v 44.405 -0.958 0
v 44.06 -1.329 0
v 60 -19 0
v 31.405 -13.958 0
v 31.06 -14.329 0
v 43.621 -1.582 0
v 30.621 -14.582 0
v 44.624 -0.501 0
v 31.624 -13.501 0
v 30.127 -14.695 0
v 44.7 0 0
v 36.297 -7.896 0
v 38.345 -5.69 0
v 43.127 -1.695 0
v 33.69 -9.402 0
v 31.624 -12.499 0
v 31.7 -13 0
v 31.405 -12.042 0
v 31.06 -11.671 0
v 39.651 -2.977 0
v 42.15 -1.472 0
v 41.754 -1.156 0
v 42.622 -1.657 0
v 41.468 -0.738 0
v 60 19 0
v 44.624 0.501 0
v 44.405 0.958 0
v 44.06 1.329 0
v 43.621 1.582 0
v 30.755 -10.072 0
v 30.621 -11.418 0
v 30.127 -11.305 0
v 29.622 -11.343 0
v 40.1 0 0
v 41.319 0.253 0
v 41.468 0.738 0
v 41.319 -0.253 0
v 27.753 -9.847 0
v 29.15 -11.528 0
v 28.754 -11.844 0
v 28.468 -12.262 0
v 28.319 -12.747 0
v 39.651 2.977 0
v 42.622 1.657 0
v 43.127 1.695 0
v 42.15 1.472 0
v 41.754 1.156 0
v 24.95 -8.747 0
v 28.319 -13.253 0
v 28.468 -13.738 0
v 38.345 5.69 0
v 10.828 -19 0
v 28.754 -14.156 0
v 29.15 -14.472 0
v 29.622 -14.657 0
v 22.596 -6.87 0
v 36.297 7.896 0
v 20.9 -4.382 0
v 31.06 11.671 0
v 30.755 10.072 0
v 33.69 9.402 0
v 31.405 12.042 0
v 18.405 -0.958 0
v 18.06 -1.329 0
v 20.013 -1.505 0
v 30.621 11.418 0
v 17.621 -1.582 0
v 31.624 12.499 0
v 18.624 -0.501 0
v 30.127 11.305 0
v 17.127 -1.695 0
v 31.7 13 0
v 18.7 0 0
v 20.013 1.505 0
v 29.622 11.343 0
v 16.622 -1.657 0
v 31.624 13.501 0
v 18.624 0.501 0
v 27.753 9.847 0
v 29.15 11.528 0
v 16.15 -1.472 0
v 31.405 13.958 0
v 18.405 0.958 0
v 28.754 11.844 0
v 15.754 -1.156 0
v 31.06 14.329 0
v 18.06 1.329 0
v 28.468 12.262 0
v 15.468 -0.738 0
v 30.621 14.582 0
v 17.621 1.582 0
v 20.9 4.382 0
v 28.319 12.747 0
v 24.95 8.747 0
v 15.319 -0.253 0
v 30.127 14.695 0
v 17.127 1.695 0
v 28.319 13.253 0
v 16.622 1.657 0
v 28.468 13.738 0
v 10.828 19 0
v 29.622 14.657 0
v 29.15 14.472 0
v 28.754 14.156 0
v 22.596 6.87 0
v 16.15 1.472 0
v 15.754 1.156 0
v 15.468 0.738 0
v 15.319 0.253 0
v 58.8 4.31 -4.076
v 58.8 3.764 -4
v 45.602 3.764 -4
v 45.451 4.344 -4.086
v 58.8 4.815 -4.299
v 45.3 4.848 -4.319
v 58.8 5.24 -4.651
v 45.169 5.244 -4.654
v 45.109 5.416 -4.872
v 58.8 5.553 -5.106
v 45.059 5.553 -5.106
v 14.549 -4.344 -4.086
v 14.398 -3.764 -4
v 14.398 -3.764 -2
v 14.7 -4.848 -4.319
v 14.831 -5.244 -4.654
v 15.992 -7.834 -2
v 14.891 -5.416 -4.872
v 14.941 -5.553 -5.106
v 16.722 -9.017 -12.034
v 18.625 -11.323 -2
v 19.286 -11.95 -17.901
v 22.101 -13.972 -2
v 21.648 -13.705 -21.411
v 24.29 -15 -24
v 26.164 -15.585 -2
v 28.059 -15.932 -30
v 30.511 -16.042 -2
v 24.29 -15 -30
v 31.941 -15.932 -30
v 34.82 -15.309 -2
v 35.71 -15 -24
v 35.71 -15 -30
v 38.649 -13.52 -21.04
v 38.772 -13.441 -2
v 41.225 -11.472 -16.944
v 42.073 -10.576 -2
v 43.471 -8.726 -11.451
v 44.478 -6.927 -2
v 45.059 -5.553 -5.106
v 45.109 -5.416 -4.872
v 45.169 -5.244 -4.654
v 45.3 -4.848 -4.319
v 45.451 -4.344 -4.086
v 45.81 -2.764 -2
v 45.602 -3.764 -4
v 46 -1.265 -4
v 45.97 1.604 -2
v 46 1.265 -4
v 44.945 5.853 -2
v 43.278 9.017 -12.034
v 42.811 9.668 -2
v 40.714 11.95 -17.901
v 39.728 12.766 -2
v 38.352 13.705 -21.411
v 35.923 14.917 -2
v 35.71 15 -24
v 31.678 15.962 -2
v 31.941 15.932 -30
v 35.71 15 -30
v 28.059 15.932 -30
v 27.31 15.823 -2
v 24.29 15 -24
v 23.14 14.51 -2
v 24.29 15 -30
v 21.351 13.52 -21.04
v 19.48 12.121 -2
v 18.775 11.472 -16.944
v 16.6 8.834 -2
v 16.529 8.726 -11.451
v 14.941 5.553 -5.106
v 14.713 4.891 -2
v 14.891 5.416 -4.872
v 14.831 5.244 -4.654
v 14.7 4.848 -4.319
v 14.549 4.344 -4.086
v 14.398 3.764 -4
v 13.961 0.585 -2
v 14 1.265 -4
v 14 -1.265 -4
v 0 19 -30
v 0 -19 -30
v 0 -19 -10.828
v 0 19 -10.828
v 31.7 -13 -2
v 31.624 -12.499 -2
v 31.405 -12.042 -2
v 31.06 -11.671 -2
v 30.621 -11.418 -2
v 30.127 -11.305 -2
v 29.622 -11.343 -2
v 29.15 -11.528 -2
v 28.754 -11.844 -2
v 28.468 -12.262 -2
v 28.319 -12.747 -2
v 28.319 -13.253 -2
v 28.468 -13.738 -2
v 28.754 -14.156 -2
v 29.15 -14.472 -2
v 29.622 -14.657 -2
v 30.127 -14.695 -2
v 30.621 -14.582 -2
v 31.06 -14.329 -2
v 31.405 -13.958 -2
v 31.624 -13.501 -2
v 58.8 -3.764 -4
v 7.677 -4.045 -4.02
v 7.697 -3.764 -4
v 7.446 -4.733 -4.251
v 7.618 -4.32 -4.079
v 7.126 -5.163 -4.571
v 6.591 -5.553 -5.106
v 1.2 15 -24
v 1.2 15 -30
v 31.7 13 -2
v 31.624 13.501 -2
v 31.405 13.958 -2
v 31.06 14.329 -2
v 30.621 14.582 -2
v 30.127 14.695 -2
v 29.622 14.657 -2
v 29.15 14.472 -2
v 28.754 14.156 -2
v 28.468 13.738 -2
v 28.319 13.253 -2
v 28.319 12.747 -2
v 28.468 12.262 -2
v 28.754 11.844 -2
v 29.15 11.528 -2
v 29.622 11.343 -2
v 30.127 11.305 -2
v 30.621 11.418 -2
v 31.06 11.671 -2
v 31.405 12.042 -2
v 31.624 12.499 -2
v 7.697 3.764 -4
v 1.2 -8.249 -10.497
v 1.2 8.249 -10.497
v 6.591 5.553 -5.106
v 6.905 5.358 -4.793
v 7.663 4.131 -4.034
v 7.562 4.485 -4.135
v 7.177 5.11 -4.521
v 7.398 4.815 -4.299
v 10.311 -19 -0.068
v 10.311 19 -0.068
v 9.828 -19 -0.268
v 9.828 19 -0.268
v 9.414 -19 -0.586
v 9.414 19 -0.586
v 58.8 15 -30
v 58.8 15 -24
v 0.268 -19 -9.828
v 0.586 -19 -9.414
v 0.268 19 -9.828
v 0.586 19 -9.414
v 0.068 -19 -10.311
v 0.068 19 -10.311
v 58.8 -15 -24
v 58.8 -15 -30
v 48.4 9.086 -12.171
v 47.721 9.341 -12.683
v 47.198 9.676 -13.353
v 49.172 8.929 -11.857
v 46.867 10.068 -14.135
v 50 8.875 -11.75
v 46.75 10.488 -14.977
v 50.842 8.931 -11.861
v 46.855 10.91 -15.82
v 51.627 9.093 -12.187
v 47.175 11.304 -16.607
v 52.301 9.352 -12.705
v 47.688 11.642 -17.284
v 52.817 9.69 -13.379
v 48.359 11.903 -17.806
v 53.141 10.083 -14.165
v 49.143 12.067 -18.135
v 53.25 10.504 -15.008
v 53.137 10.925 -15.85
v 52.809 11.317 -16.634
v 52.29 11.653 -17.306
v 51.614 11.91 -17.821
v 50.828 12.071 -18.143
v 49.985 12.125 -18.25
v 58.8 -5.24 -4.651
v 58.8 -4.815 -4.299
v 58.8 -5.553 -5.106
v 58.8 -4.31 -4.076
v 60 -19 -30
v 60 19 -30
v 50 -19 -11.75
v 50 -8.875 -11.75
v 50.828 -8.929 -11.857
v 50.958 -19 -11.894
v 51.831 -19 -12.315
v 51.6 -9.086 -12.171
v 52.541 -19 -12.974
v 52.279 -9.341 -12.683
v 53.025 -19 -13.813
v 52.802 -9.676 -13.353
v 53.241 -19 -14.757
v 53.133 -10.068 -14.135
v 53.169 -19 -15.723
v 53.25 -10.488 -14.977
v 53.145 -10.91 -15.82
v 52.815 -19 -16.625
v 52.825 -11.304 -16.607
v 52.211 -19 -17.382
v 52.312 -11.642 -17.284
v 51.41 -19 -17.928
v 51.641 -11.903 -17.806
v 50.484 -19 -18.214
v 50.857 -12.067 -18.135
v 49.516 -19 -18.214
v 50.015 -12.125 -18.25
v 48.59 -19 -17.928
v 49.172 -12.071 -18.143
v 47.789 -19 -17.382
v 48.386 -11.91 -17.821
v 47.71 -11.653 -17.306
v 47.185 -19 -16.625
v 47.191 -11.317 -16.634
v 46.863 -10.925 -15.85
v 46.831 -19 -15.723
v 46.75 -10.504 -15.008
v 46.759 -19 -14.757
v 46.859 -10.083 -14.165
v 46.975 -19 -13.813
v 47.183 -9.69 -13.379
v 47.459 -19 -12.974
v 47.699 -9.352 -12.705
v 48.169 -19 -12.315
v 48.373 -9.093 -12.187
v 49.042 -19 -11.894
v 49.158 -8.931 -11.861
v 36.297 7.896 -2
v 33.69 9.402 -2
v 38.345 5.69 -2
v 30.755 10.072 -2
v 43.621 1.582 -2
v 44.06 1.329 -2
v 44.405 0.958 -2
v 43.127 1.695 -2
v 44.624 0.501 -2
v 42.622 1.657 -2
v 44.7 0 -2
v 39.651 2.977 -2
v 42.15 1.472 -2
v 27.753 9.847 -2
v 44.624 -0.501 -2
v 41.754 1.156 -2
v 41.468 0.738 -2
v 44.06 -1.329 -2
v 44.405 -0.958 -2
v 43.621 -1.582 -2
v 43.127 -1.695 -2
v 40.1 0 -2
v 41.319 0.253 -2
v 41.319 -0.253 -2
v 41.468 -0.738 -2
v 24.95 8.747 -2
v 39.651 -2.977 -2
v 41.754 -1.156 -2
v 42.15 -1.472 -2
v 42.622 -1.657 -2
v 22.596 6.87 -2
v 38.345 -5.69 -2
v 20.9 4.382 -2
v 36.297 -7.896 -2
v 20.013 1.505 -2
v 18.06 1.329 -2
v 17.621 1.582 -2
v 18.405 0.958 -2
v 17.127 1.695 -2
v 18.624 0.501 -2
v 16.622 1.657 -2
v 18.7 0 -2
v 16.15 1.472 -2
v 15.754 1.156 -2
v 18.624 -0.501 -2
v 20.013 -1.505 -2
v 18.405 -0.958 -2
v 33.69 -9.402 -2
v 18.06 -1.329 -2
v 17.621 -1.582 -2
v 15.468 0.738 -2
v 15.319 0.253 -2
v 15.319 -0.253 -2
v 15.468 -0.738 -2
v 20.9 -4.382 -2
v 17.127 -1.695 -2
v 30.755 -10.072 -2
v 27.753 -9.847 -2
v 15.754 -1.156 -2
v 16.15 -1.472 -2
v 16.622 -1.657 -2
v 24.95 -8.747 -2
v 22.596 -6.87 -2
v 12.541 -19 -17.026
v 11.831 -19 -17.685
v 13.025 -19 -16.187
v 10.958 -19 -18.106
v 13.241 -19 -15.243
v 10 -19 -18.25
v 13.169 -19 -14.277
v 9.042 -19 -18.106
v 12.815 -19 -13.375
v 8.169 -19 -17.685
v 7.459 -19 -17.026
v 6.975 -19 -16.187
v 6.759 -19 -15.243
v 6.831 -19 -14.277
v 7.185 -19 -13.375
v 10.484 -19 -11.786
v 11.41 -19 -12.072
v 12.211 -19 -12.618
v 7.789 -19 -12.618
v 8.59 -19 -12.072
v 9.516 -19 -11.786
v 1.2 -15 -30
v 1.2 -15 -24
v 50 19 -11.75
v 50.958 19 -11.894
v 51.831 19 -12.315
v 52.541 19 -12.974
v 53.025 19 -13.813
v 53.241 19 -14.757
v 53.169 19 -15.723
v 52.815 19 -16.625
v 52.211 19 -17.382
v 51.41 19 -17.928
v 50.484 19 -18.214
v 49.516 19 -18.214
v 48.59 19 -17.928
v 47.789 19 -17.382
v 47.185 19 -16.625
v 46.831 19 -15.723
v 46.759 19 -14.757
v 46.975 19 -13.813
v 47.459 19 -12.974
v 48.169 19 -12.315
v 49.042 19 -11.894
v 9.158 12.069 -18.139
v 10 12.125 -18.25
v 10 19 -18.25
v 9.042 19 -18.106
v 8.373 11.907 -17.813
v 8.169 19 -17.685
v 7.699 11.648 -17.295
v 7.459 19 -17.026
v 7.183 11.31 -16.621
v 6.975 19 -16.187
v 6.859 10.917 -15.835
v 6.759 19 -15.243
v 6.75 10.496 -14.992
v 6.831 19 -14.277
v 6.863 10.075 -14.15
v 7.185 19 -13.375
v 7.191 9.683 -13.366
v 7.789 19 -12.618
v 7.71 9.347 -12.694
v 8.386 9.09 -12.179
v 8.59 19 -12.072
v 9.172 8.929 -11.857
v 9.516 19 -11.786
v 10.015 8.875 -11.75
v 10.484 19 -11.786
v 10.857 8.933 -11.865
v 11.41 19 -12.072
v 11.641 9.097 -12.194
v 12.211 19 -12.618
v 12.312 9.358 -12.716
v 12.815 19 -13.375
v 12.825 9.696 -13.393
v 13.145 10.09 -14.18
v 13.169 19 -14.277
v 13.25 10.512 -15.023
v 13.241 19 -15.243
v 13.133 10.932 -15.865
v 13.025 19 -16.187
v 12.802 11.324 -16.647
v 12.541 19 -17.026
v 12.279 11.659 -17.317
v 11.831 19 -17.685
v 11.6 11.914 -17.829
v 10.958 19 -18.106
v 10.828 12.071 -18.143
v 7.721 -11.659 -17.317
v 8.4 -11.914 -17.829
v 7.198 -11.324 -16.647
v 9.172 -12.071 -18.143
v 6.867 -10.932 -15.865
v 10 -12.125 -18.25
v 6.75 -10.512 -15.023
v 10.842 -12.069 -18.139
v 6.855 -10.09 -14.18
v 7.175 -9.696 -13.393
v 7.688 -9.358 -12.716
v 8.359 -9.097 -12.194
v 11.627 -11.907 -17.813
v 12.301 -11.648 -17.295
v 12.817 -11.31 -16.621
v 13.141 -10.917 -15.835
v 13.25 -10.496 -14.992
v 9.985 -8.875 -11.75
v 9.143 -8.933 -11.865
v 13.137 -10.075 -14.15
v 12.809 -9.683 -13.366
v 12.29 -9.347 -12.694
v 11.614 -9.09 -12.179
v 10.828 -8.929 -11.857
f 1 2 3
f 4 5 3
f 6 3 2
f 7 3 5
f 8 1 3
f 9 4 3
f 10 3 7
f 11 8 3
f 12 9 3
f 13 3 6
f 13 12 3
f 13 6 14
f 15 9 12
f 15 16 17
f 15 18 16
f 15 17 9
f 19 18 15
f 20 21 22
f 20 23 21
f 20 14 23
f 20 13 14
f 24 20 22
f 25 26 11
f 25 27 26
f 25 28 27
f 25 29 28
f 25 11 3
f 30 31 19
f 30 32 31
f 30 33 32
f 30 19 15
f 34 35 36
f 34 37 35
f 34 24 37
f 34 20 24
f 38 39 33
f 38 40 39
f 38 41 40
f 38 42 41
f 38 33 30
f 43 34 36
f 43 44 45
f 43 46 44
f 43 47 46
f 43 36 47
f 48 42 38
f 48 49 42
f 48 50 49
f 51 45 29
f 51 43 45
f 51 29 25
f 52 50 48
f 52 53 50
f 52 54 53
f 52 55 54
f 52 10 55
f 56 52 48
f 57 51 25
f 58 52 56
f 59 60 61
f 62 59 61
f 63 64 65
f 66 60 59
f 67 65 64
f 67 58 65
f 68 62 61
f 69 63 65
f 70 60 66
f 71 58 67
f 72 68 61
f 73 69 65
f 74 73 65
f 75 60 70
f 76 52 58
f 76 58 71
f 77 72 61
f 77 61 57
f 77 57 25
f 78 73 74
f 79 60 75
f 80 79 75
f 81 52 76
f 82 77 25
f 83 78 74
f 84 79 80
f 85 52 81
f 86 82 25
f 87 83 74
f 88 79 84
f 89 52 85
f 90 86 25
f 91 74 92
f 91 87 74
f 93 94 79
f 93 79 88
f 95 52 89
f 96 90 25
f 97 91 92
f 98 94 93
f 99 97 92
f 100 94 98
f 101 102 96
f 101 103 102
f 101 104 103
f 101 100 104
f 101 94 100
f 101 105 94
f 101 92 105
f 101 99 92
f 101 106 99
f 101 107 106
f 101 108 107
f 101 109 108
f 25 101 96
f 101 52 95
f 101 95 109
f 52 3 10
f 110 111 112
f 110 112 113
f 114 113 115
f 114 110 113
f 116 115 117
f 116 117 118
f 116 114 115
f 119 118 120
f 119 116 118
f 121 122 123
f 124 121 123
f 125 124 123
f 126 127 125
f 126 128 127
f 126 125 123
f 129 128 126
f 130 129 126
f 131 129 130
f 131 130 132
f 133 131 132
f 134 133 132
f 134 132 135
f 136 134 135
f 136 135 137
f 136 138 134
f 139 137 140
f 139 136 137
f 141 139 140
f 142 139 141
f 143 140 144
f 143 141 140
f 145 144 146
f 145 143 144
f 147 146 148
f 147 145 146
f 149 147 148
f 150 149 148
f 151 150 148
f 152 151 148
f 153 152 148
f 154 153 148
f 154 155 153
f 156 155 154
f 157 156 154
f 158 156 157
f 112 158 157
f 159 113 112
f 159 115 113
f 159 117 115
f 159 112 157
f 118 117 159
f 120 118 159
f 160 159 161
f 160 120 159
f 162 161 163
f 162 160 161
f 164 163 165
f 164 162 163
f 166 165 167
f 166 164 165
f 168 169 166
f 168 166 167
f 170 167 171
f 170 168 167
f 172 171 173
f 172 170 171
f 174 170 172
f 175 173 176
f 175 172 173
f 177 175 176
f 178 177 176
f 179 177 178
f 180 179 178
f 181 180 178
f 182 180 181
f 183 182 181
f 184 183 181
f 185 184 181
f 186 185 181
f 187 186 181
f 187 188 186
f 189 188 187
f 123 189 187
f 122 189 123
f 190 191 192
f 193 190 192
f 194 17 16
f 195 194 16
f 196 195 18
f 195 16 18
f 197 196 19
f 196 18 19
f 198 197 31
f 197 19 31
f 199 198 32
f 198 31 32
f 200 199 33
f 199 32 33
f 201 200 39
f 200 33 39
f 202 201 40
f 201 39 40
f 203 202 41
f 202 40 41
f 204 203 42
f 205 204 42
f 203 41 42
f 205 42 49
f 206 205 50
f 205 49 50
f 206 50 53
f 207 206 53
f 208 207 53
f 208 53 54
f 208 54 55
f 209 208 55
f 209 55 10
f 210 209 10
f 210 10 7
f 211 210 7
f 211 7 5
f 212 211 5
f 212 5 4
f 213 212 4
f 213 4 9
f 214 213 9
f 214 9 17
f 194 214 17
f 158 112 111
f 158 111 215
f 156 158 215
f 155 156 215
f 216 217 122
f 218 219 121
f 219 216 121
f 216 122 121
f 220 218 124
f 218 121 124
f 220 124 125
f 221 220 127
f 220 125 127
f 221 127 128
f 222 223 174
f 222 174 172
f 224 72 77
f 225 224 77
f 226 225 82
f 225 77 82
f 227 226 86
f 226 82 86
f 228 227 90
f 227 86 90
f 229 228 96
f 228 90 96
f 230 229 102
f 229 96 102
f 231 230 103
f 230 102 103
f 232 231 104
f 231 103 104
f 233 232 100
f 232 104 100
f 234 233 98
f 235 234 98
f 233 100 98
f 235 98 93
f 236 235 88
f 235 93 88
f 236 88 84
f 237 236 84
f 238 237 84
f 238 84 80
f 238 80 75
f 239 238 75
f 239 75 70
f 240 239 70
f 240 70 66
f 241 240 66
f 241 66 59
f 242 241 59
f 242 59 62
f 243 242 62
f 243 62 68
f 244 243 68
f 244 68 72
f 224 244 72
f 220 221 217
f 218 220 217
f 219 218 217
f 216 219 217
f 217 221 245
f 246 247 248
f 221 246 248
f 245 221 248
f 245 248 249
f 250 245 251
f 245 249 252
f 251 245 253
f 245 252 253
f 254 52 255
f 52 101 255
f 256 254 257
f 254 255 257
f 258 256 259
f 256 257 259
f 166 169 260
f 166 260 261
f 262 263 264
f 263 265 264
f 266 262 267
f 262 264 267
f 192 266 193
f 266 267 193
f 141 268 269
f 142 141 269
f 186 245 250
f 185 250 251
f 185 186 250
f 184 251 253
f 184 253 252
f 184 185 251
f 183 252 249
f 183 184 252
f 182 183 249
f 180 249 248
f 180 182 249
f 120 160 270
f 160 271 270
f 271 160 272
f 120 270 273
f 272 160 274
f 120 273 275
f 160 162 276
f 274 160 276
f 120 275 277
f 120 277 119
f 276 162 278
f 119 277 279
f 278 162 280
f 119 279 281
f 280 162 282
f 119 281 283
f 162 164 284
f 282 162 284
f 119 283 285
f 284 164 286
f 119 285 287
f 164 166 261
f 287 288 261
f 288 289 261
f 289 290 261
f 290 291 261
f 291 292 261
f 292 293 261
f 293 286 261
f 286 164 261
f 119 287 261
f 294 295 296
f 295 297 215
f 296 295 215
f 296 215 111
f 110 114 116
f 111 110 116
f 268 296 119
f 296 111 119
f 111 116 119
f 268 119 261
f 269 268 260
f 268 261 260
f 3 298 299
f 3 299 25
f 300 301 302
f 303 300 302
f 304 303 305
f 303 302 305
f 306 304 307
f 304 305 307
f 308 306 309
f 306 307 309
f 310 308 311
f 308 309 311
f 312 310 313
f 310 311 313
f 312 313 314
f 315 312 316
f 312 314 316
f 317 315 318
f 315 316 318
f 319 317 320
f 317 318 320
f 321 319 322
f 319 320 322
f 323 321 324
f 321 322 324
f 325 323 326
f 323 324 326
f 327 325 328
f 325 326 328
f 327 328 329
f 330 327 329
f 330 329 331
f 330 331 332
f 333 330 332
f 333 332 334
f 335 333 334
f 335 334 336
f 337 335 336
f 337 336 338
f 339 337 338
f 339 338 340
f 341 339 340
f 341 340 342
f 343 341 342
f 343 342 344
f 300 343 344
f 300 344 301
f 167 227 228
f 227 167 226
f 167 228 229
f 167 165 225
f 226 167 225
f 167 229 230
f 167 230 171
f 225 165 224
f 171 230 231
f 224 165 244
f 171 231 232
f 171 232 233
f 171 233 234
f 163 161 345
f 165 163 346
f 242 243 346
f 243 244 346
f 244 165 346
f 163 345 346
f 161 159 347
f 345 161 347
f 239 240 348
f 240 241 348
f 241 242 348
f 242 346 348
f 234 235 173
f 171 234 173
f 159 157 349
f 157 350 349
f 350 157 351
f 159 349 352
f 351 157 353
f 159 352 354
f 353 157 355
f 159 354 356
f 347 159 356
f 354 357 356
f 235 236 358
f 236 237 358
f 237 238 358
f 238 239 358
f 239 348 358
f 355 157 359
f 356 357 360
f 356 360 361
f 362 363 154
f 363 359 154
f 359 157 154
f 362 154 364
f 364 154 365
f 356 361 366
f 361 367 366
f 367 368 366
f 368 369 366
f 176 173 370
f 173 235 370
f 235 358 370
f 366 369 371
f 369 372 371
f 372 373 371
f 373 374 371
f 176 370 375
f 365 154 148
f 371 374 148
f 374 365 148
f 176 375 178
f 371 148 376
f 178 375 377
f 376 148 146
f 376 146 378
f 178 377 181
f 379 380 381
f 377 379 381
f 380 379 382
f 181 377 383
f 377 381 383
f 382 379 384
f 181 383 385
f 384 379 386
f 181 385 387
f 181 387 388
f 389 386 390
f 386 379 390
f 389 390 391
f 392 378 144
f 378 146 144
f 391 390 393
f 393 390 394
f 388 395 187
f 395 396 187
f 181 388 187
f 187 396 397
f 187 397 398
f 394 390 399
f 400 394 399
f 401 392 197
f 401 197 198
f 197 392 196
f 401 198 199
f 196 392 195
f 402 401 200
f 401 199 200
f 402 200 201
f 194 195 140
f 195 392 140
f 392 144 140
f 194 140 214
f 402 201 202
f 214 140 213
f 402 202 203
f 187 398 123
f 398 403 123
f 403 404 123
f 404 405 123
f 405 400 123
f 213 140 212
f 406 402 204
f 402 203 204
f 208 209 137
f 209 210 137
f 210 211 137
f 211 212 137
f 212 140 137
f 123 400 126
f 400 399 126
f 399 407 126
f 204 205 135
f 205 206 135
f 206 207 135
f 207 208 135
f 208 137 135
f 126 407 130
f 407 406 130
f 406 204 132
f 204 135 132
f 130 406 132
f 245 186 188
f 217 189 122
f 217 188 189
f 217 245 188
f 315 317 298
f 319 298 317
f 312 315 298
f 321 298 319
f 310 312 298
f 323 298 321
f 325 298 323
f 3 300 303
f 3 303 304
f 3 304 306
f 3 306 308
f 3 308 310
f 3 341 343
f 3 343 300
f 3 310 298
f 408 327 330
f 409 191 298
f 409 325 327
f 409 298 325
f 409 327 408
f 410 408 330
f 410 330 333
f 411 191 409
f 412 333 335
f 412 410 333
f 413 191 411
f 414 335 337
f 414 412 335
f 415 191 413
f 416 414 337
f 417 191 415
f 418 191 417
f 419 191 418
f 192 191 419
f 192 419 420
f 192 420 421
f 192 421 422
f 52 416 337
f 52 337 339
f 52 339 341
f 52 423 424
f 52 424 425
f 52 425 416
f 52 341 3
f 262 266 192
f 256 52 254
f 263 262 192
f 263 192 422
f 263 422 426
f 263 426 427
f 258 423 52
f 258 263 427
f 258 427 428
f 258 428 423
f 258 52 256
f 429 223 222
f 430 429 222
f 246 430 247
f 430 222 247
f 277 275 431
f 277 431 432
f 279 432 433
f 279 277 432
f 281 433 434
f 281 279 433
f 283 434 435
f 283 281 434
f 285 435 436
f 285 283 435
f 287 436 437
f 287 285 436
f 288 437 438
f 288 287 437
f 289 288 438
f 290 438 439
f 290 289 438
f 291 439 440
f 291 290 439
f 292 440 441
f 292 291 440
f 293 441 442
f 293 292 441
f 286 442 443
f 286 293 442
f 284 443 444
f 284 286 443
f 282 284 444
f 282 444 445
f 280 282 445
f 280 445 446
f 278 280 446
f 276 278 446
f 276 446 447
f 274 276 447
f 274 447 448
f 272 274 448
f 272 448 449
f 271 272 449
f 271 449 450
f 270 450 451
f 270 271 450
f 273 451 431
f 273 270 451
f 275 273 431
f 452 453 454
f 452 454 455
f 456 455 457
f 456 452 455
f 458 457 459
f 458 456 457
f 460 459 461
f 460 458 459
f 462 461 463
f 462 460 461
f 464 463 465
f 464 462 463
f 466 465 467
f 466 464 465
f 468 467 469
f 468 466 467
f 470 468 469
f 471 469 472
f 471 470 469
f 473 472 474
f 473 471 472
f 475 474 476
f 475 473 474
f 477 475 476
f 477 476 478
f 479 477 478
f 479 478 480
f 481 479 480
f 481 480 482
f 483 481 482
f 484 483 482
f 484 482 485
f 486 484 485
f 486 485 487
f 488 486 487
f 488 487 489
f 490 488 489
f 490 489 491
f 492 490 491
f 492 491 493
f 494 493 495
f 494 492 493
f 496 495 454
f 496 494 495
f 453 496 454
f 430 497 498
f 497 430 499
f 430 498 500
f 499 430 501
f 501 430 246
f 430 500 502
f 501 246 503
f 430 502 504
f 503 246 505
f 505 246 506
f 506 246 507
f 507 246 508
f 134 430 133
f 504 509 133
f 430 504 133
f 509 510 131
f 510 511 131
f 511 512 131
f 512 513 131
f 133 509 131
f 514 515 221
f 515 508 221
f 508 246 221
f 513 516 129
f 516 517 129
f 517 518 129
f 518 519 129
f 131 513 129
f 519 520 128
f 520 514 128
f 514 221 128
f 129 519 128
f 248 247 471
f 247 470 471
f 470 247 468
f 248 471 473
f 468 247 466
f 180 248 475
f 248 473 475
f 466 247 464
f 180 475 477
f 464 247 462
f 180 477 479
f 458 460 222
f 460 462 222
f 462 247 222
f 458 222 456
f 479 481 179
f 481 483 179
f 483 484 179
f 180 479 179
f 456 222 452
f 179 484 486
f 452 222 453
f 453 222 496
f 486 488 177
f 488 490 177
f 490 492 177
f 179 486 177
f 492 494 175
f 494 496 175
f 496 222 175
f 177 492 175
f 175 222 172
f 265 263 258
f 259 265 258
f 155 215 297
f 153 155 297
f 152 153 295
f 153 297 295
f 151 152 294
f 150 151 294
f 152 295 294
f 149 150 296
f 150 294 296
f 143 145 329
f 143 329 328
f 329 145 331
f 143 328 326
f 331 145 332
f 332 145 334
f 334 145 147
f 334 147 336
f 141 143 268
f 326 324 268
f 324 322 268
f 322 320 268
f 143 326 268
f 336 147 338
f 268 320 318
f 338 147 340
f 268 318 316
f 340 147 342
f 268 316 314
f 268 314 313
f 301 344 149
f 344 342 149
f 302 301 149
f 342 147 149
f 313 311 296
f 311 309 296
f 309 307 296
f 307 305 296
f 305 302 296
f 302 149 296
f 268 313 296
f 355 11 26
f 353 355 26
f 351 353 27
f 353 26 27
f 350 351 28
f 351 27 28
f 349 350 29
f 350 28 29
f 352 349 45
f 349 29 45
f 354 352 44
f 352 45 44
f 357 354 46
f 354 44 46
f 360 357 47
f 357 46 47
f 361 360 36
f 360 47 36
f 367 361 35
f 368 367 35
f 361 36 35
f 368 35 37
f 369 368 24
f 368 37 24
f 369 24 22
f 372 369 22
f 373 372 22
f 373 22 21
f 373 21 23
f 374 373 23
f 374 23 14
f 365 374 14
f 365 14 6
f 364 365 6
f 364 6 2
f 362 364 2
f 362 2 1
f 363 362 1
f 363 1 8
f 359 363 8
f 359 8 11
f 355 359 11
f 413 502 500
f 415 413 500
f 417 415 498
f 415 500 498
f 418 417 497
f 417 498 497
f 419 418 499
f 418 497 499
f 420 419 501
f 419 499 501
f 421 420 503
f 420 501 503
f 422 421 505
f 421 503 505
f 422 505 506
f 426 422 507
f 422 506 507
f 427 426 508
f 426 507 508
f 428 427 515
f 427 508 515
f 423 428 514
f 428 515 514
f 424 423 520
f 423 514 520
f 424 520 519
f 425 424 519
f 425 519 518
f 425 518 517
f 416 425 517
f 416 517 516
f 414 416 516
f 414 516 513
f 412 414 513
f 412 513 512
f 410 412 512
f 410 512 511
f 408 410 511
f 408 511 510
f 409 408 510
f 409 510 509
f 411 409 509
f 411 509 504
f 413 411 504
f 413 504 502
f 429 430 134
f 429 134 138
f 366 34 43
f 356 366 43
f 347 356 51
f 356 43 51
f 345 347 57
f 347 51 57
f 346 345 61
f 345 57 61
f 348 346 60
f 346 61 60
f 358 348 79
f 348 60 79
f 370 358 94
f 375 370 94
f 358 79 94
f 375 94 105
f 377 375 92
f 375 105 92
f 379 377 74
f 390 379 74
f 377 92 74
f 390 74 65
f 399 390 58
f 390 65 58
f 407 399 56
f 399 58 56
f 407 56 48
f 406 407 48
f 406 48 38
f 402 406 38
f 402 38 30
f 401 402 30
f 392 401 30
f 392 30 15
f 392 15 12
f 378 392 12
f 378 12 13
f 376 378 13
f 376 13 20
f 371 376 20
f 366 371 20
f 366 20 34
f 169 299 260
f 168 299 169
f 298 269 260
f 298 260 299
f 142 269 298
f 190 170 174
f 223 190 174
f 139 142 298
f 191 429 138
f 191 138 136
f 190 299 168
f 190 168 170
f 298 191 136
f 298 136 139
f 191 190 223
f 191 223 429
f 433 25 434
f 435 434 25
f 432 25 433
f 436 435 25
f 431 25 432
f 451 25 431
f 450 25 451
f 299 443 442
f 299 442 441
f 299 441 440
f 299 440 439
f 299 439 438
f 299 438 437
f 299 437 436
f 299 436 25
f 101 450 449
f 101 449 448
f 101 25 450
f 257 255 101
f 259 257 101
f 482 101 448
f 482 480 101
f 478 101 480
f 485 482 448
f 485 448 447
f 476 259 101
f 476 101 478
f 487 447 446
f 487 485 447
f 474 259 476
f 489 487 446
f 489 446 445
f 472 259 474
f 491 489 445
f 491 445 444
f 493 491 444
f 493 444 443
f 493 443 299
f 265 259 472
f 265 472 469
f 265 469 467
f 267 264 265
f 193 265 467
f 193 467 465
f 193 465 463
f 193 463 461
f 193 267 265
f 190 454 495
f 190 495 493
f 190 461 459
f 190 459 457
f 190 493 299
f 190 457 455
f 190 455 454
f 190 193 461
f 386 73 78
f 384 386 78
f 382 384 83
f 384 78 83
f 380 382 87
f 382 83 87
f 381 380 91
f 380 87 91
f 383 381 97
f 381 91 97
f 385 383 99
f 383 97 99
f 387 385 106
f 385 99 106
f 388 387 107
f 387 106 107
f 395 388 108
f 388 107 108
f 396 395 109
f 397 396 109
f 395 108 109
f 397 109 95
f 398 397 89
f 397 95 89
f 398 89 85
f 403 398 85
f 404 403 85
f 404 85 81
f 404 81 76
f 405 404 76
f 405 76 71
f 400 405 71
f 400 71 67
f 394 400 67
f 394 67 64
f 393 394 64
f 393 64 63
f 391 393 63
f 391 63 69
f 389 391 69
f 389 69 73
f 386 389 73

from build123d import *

# Parameters (mm, degrees)
BOSS_EXTRU_1_DEPTH                  = 60
CHANFREIN2_SIZE                     = 10
CHANFREIN2_SIZE2                    = 20
CHANFREIN3_SIZE                     = 20
CHANFREIN3_SIZE2                    = 10
CONG_3_R                            = 2
ENL_V_MAT_EXTRU_4_DEPTH             = 2
ENL_V_MAT_EXTRU_4_DEPTH_BACK        = 66.720872054
ENL_V_MAT_EXTRU_4_START             = -4
ESQUISSE5_R                         = 16.05
ESQUISSE2_R                         = 1.7
ESQUISSE2_R_2                       = 10.1
ENL_V_MAT_EXTRU_1_DEPTH             = 70.720872183
ESQUISSE3_R                         = 1.6
ENL_V_MAT_EXTRU_2_DEPTH             = 78.097341186
ENL_V_MAT_EXTRU_5_REACH             = 71.721
ESQUISSE6_R                         = 3.25
ENL_V_MAT_EXTRU_5_DIRECTION_2_REACH = 71.721
CHANFREIN1_SIZE                     = 10
BOSS_EXTRU_3_REACH                  = 79.097
ESQUISSE8_W                         = 1.2
ESQUISSE8_H                         = 30
CONG_2_R                            = 2


with BuildPart() as part:
    # Esquisse1 → Boss.-Extru.1 (new body)
    with BuildSketch(Plane(origin=(0, 0, 0), x_dir=(0, 0, -1), z_dir=(1, 0, 0))):
        Polygon((0, -19), (0, 19), (30, 19), (30, 15), (4, 15), (4, -15), (30, -15), (30, -19), align=None)
    extrude(amount=BOSS_EXTRU_1_DEPTH)

    # Chanfrein2
    chanfrein2_edges = [part.edges().sort_by_distance(p)[0] for p in [
        (30, 15, -4),
    ]]
    chanfrein2_side = [part.faces().sort_by_distance(p)[0] for p in [
        (30, 0, -4),
    ]]
    chamfer(chanfrein2_edges, length=CHANFREIN2_SIZE, length2=CHANFREIN2_SIZE2, reference=chanfrein2_side[0])

    # Chanfrein3
    chanfrein3_edges = [part.edges().sort_by_distance(p)[0] for p in [
        (30, -15, -4),
    ]]
    chanfrein3_side = [part.faces().sort_by_distance(p)[0] for p in [
        (30, -15, -17),
    ]]
    chamfer(chanfrein3_edges, length=CHANFREIN3_SIZE, length2=CHANFREIN3_SIZE2, reference=chanfrein3_side[0])

    # Congé3
    cong_3_edges = [part.edges().sort_by_distance(p)[0] for p in [
        (30, 5, -4),
        (30, -5, -4),
    ]]
    fillet(cong_3_edges, radius=CONG_3_R)

    # Esquisse5 → Enlèv. mat.-Extru.4 (cut, two sides: drawn at the far end of the back side and taken through both)
    with BuildSketch(Plane.XY.offset(ENL_V_MAT_EXTRU_4_START - ENL_V_MAT_EXTRU_4_DEPTH_BACK)):
        with Locations(Location((30, 0, 0), (0, 0, 193.562911562))):
            Circle(ESQUISSE5_R)
    extrude(amount=ENL_V_MAT_EXTRU_4_DEPTH + ENL_V_MAT_EXTRU_4_DEPTH_BACK, mode=Mode.SUBTRACT)

    # Esquisse2 → Enlèv. mat.-Extru.1 (cut, through all)
    with BuildSketch(Plane.XY):
        with Locations((30, 13)):
            Circle(ESQUISSE2_R)
        with Locations((43, 0)):
            Circle(ESQUISSE2_R)
        with Locations((30, -13)):
            Circle(ESQUISSE2_R)
        with Locations((17, 0)):
            Circle(ESQUISSE2_R)
        with Locations((30, 0)):
            Circle(ESQUISSE2_R_2)
    extrude(amount=-ENL_V_MAT_EXTRU_1_DEPTH, mode=Mode.SUBTRACT)

    # Esquisse3 → Enlèv. mat.-Extru.2 (cut, through all)
    with BuildSketch(Plane.XZ.offset(19)):
        with Locations(Location((10, -15, 0), (0, 0, 270))):
            Circle(ESQUISSE3_R)
        with Locations(Location((50, -15, 0), (0, 0, 270))):
            Circle(ESQUISSE3_R)
    extrude(amount=-ENL_V_MAT_EXTRU_2_DEPTH, mode=Mode.SUBTRACT)

    # Enlèv. mat.-Extru.5: up to this face of the body (flat: up to its plane)
    enl_v_mat_extru_5_end = Plane(part.part.faces().sort_by_distance((30, -19, -15))[0])
    # Esquisse6 → Enlèv. mat.-Extru.5 (cut, up to the picked face)
    with BuildSketch(Plane(origin=(0, 0, 0), x_dir=(1, 0, 0), z_dir=(0, 1, 0)), mode=Mode.PRIVATE) as enl_v_mat_extru_5_sk1:
        with Locations(Location((10, 15, 0), (0, 0, 90))):
            Circle(ESQUISSE6_R)
    enl_v_mat_extru_5_tool1 = split(extrude(enl_v_mat_extru_5_sk1.sketch, amount=-ENL_V_MAT_EXTRU_5_REACH, mode=Mode.PRIVATE), bisect_by=enl_v_mat_extru_5_end, keep=Keep.BOTH, mode=Mode.PRIVATE)
    # Esquisse6 → Enlèv. mat.-Extru.5 (cut, up to the picked face)
    with BuildSketch(Plane(origin=(0, 0, 0), x_dir=(1, 0, 0), z_dir=(0, 1, 0)), mode=Mode.PRIVATE) as enl_v_mat_extru_5_sk2:
        with Locations(Location((50, 15, 0), (0, 0, 270))):
            Circle(ESQUISSE6_R)
    enl_v_mat_extru_5_tool2 = split(extrude(enl_v_mat_extru_5_sk2.sketch, amount=-ENL_V_MAT_EXTRU_5_REACH, mode=Mode.PRIVATE), bisect_by=enl_v_mat_extru_5_end, keep=Keep.BOTH, mode=Mode.PRIVATE)
    add(enl_v_mat_extru_5_tool1.solids().sort_by(Axis((10, 0, -15), (0, -1, 0)))[0], mode=Mode.SUBTRACT)
    add(enl_v_mat_extru_5_tool2.solids().sort_by(Axis((50, 0, -15), (0, -1, 0)))[0], mode=Mode.SUBTRACT)

    # Enlèv. mat.-Extru.5 direction 2: up to this face of the body (flat: up to its plane)
    enl_v_mat_extru_5_direction_2_end = Plane(part.part.faces().sort_by_distance((30, 19, -15))[0])
    # Esquisse6 → Enlèv. mat.-Extru.5 direction 2 (cut, up to the picked face)
    with BuildSketch(Plane(origin=(0, 0, 0), x_dir=(1, 0, 0), z_dir=(0, 1, 0)), mode=Mode.PRIVATE) as enl_v_mat_extru_5_direction_2_sk1:
        with Locations(Location((10, 15, 0), (0, 0, 90))):
            Circle(ESQUISSE6_R)
    enl_v_mat_extru_5_direction_2_tool1 = split(extrude(enl_v_mat_extru_5_direction_2_sk1.sketch, amount=ENL_V_MAT_EXTRU_5_DIRECTION_2_REACH, mode=Mode.PRIVATE), bisect_by=enl_v_mat_extru_5_direction_2_end, keep=Keep.BOTH, mode=Mode.PRIVATE)
    # Esquisse6 → Enlèv. mat.-Extru.5 direction 2 (cut, up to the picked face)
    with BuildSketch(Plane(origin=(0, 0, 0), x_dir=(1, 0, 0), z_dir=(0, 1, 0)), mode=Mode.PRIVATE) as enl_v_mat_extru_5_direction_2_sk2:
        with Locations(Location((50, 15, 0), (0, 0, 270))):
            Circle(ESQUISSE6_R)
    enl_v_mat_extru_5_direction_2_tool2 = split(extrude(enl_v_mat_extru_5_direction_2_sk2.sketch, amount=ENL_V_MAT_EXTRU_5_DIRECTION_2_REACH, mode=Mode.PRIVATE), bisect_by=enl_v_mat_extru_5_direction_2_end, keep=Keep.BOTH, mode=Mode.PRIVATE)
    add(enl_v_mat_extru_5_direction_2_tool1.solids().sort_by(Axis((10, 0, -15), (0, 1, 0)))[0], mode=Mode.SUBTRACT)
    add(enl_v_mat_extru_5_direction_2_tool2.solids().sort_by(Axis((50, 0, -15), (0, 1, 0)))[0], mode=Mode.SUBTRACT)

    # Chanfrein1
    # the kernel refuses this chamfer: 10 mm, written as the material it takes off along each edge
    with BuildSketch(Plane(origin=(0, -44.71682988, 0), x_dir=(-0.027495876610586372, 0, -0.9996219169112968), z_dir=(0, 1, 0))) as chanfrein1_piece_1:
        Polygon((CHANFREIN1_SIZE * 0.999621916911, -CHANFREIN1_SIZE * 0.0274958766106), (-CHANFREIN1_SIZE * 0.0274958766106, -CHANFREIN1_SIZE * 0.999621916911), (0, 0), align=None)
    extrude(amount=89.433659759, mode=Mode.SUBTRACT)

    # Boss.-Extru.3: up to this face of the body (flat: up to its plane)
    boss_extru_3_end = Plane(part.part.faces().sort_by_distance((30.791937825, -19, -15.346472798))[0])
    # Esquisse8 → Boss.-Extru.3 (add, up to the picked face)
    with BuildSketch(Plane(origin=(0, 19, 0), x_dir=(1, 0, 0), z_dir=(0, 1, 0)), mode=Mode.PRIVATE) as boss_extru_3_sk1:
        with Locations((59.4, 15)):
            Rectangle(ESQUISSE8_W, ESQUISSE8_H)
    boss_extru_3_tool1 = split(extrude(boss_extru_3_sk1.sketch, amount=-BOSS_EXTRU_3_REACH, mode=Mode.PRIVATE), bisect_by=boss_extru_3_end, keep=Keep.BOTH, mode=Mode.PRIVATE)
    # Esquisse8 → Boss.-Extru.3 (add, up to the picked face)
    with BuildSketch(Plane(origin=(0, 19, 0), x_dir=(1, 0, 0), z_dir=(0, 1, 0)), mode=Mode.PRIVATE) as boss_extru_3_sk2:
        Polygon((1.2, 30), (1.2, 10.497056275), (10.848528137, 0.848528137), (10, 0), (0, 10), (0, 30), align=None)
    boss_extru_3_tool2 = split(extrude(boss_extru_3_sk2.sketch, amount=-BOSS_EXTRU_3_REACH, mode=Mode.PRIVATE), bisect_by=boss_extru_3_end, keep=Keep.BOTH, mode=Mode.PRIVATE)
    add(boss_extru_3_tool1.solids().sort_by(Axis((59.4, 19, -15), (0, -1, 0)))[0])
    add(boss_extru_3_tool2.solids().sort_by(Axis((0.880987, 19, -20.248528), (0, -1, 0)))[0])

    # Congé2
    cong_2_edges = [part.edges().sort_by_distance(p)[0] for p in [
        (10, 0, 0),
        (0, 0, -10),
    ]]
    fillet(cong_2_edges, radius=CONG_2_R)


solid = part.part
